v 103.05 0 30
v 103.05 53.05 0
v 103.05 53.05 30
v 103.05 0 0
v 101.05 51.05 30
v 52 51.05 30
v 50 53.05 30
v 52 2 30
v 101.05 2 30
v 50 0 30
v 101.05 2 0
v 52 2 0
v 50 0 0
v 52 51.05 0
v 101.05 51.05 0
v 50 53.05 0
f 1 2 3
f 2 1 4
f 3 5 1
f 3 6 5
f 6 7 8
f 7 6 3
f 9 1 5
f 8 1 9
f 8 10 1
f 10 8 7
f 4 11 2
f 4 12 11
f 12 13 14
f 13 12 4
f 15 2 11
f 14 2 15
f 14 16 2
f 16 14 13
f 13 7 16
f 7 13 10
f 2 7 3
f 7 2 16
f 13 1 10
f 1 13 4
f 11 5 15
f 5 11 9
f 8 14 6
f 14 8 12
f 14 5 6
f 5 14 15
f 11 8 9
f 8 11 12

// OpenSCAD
//key unit size
unit = 19.05;

//height of keycap
height = 13;

//minimum mold thickness
extra = 15;

//thicknesses of the mold
side_thickness = 2;
bottom_thickness = 2;

total_side = unit + extra*2 + side_thickness * 2;

function hypo(num) = sqrt(pow(num,2) / 2);

module bottom_mold(){
  difference(){
    //outer box
    cube([
      total_side,
      total_side,
      5 + bottom_thickness,
    ]);

    //inner box
    translate([
      side_thickness,
      side_thickness,
      bottom_thickness
    ]) {
      cube([
        unit + extra*2,
        unit + extra*2,
        5,
      ]);
    }
  }

  translate([total_side / 2, total_side / 2, 5 + bottom_thickness]) rotate([0,0,45]) difference(){
    //outer box
      cylinder(
      height + extra - 5,
      hypo(total_side),
      hypo(total_side + 3),
      $fn=4
    );

    //inner box
    cylinder(
      height + extra - 5,
      hypo(unit + extra*2),
      hypo(unit + extra*2 + 3),
      $fn=4
    );
  }
  //platform
  translate([
    side_thickness + extra,
    side_thickness + extra,
    bottom_thickness
  ]) cube([unit, unit, bottom_thickness]);
/*
  translate([
    side_thickness + extra + unit / 2,
    side_thickness + extra + unit / 2,
    bottom_thickness*2
  ]) rotate([0,0,45]) cylinder(bottom_thickness, unit/2 + 1, unit / 2, $fn=4);*/

  //registration
  translate([
    side_thickness + extra / 2,
    side_thickness + extra / 2,
    bottom_thickness
  ]) cylinder(3,extra/3, extra/4, $fn=4);

  //registration
  translate([
    side_thickness +  extra / 2,
    side_thickness + unit + extra * 1.5,
    bottom_thickness
  ]) cylinder(3,extra/3, extra/4, $fn=4);

  //registration
  translate([
    side_thickness + unit + extra * 1.5,
    side_thickness + unit + extra * 1.5,
    bottom_thickness
  ]) cylinder(3,extra/3, extra/4, $fn=4);
}

module top_mold(){
  difference(){
    //outer box
    cube([
      total_side,
      total_side,
      height + extra + bottom_thickness,
    ]);

    //inner box
    translate([
      side_thickness,
      side_thickness,
      0
    ]) {
      cube([
        unit + extra*2,
        unit + extra*2,
        height + extra + bottom_thickness,
      ]);
    }
  }
}

/*bottom_mold();*/

translate([50,0,0]) top_mold();
